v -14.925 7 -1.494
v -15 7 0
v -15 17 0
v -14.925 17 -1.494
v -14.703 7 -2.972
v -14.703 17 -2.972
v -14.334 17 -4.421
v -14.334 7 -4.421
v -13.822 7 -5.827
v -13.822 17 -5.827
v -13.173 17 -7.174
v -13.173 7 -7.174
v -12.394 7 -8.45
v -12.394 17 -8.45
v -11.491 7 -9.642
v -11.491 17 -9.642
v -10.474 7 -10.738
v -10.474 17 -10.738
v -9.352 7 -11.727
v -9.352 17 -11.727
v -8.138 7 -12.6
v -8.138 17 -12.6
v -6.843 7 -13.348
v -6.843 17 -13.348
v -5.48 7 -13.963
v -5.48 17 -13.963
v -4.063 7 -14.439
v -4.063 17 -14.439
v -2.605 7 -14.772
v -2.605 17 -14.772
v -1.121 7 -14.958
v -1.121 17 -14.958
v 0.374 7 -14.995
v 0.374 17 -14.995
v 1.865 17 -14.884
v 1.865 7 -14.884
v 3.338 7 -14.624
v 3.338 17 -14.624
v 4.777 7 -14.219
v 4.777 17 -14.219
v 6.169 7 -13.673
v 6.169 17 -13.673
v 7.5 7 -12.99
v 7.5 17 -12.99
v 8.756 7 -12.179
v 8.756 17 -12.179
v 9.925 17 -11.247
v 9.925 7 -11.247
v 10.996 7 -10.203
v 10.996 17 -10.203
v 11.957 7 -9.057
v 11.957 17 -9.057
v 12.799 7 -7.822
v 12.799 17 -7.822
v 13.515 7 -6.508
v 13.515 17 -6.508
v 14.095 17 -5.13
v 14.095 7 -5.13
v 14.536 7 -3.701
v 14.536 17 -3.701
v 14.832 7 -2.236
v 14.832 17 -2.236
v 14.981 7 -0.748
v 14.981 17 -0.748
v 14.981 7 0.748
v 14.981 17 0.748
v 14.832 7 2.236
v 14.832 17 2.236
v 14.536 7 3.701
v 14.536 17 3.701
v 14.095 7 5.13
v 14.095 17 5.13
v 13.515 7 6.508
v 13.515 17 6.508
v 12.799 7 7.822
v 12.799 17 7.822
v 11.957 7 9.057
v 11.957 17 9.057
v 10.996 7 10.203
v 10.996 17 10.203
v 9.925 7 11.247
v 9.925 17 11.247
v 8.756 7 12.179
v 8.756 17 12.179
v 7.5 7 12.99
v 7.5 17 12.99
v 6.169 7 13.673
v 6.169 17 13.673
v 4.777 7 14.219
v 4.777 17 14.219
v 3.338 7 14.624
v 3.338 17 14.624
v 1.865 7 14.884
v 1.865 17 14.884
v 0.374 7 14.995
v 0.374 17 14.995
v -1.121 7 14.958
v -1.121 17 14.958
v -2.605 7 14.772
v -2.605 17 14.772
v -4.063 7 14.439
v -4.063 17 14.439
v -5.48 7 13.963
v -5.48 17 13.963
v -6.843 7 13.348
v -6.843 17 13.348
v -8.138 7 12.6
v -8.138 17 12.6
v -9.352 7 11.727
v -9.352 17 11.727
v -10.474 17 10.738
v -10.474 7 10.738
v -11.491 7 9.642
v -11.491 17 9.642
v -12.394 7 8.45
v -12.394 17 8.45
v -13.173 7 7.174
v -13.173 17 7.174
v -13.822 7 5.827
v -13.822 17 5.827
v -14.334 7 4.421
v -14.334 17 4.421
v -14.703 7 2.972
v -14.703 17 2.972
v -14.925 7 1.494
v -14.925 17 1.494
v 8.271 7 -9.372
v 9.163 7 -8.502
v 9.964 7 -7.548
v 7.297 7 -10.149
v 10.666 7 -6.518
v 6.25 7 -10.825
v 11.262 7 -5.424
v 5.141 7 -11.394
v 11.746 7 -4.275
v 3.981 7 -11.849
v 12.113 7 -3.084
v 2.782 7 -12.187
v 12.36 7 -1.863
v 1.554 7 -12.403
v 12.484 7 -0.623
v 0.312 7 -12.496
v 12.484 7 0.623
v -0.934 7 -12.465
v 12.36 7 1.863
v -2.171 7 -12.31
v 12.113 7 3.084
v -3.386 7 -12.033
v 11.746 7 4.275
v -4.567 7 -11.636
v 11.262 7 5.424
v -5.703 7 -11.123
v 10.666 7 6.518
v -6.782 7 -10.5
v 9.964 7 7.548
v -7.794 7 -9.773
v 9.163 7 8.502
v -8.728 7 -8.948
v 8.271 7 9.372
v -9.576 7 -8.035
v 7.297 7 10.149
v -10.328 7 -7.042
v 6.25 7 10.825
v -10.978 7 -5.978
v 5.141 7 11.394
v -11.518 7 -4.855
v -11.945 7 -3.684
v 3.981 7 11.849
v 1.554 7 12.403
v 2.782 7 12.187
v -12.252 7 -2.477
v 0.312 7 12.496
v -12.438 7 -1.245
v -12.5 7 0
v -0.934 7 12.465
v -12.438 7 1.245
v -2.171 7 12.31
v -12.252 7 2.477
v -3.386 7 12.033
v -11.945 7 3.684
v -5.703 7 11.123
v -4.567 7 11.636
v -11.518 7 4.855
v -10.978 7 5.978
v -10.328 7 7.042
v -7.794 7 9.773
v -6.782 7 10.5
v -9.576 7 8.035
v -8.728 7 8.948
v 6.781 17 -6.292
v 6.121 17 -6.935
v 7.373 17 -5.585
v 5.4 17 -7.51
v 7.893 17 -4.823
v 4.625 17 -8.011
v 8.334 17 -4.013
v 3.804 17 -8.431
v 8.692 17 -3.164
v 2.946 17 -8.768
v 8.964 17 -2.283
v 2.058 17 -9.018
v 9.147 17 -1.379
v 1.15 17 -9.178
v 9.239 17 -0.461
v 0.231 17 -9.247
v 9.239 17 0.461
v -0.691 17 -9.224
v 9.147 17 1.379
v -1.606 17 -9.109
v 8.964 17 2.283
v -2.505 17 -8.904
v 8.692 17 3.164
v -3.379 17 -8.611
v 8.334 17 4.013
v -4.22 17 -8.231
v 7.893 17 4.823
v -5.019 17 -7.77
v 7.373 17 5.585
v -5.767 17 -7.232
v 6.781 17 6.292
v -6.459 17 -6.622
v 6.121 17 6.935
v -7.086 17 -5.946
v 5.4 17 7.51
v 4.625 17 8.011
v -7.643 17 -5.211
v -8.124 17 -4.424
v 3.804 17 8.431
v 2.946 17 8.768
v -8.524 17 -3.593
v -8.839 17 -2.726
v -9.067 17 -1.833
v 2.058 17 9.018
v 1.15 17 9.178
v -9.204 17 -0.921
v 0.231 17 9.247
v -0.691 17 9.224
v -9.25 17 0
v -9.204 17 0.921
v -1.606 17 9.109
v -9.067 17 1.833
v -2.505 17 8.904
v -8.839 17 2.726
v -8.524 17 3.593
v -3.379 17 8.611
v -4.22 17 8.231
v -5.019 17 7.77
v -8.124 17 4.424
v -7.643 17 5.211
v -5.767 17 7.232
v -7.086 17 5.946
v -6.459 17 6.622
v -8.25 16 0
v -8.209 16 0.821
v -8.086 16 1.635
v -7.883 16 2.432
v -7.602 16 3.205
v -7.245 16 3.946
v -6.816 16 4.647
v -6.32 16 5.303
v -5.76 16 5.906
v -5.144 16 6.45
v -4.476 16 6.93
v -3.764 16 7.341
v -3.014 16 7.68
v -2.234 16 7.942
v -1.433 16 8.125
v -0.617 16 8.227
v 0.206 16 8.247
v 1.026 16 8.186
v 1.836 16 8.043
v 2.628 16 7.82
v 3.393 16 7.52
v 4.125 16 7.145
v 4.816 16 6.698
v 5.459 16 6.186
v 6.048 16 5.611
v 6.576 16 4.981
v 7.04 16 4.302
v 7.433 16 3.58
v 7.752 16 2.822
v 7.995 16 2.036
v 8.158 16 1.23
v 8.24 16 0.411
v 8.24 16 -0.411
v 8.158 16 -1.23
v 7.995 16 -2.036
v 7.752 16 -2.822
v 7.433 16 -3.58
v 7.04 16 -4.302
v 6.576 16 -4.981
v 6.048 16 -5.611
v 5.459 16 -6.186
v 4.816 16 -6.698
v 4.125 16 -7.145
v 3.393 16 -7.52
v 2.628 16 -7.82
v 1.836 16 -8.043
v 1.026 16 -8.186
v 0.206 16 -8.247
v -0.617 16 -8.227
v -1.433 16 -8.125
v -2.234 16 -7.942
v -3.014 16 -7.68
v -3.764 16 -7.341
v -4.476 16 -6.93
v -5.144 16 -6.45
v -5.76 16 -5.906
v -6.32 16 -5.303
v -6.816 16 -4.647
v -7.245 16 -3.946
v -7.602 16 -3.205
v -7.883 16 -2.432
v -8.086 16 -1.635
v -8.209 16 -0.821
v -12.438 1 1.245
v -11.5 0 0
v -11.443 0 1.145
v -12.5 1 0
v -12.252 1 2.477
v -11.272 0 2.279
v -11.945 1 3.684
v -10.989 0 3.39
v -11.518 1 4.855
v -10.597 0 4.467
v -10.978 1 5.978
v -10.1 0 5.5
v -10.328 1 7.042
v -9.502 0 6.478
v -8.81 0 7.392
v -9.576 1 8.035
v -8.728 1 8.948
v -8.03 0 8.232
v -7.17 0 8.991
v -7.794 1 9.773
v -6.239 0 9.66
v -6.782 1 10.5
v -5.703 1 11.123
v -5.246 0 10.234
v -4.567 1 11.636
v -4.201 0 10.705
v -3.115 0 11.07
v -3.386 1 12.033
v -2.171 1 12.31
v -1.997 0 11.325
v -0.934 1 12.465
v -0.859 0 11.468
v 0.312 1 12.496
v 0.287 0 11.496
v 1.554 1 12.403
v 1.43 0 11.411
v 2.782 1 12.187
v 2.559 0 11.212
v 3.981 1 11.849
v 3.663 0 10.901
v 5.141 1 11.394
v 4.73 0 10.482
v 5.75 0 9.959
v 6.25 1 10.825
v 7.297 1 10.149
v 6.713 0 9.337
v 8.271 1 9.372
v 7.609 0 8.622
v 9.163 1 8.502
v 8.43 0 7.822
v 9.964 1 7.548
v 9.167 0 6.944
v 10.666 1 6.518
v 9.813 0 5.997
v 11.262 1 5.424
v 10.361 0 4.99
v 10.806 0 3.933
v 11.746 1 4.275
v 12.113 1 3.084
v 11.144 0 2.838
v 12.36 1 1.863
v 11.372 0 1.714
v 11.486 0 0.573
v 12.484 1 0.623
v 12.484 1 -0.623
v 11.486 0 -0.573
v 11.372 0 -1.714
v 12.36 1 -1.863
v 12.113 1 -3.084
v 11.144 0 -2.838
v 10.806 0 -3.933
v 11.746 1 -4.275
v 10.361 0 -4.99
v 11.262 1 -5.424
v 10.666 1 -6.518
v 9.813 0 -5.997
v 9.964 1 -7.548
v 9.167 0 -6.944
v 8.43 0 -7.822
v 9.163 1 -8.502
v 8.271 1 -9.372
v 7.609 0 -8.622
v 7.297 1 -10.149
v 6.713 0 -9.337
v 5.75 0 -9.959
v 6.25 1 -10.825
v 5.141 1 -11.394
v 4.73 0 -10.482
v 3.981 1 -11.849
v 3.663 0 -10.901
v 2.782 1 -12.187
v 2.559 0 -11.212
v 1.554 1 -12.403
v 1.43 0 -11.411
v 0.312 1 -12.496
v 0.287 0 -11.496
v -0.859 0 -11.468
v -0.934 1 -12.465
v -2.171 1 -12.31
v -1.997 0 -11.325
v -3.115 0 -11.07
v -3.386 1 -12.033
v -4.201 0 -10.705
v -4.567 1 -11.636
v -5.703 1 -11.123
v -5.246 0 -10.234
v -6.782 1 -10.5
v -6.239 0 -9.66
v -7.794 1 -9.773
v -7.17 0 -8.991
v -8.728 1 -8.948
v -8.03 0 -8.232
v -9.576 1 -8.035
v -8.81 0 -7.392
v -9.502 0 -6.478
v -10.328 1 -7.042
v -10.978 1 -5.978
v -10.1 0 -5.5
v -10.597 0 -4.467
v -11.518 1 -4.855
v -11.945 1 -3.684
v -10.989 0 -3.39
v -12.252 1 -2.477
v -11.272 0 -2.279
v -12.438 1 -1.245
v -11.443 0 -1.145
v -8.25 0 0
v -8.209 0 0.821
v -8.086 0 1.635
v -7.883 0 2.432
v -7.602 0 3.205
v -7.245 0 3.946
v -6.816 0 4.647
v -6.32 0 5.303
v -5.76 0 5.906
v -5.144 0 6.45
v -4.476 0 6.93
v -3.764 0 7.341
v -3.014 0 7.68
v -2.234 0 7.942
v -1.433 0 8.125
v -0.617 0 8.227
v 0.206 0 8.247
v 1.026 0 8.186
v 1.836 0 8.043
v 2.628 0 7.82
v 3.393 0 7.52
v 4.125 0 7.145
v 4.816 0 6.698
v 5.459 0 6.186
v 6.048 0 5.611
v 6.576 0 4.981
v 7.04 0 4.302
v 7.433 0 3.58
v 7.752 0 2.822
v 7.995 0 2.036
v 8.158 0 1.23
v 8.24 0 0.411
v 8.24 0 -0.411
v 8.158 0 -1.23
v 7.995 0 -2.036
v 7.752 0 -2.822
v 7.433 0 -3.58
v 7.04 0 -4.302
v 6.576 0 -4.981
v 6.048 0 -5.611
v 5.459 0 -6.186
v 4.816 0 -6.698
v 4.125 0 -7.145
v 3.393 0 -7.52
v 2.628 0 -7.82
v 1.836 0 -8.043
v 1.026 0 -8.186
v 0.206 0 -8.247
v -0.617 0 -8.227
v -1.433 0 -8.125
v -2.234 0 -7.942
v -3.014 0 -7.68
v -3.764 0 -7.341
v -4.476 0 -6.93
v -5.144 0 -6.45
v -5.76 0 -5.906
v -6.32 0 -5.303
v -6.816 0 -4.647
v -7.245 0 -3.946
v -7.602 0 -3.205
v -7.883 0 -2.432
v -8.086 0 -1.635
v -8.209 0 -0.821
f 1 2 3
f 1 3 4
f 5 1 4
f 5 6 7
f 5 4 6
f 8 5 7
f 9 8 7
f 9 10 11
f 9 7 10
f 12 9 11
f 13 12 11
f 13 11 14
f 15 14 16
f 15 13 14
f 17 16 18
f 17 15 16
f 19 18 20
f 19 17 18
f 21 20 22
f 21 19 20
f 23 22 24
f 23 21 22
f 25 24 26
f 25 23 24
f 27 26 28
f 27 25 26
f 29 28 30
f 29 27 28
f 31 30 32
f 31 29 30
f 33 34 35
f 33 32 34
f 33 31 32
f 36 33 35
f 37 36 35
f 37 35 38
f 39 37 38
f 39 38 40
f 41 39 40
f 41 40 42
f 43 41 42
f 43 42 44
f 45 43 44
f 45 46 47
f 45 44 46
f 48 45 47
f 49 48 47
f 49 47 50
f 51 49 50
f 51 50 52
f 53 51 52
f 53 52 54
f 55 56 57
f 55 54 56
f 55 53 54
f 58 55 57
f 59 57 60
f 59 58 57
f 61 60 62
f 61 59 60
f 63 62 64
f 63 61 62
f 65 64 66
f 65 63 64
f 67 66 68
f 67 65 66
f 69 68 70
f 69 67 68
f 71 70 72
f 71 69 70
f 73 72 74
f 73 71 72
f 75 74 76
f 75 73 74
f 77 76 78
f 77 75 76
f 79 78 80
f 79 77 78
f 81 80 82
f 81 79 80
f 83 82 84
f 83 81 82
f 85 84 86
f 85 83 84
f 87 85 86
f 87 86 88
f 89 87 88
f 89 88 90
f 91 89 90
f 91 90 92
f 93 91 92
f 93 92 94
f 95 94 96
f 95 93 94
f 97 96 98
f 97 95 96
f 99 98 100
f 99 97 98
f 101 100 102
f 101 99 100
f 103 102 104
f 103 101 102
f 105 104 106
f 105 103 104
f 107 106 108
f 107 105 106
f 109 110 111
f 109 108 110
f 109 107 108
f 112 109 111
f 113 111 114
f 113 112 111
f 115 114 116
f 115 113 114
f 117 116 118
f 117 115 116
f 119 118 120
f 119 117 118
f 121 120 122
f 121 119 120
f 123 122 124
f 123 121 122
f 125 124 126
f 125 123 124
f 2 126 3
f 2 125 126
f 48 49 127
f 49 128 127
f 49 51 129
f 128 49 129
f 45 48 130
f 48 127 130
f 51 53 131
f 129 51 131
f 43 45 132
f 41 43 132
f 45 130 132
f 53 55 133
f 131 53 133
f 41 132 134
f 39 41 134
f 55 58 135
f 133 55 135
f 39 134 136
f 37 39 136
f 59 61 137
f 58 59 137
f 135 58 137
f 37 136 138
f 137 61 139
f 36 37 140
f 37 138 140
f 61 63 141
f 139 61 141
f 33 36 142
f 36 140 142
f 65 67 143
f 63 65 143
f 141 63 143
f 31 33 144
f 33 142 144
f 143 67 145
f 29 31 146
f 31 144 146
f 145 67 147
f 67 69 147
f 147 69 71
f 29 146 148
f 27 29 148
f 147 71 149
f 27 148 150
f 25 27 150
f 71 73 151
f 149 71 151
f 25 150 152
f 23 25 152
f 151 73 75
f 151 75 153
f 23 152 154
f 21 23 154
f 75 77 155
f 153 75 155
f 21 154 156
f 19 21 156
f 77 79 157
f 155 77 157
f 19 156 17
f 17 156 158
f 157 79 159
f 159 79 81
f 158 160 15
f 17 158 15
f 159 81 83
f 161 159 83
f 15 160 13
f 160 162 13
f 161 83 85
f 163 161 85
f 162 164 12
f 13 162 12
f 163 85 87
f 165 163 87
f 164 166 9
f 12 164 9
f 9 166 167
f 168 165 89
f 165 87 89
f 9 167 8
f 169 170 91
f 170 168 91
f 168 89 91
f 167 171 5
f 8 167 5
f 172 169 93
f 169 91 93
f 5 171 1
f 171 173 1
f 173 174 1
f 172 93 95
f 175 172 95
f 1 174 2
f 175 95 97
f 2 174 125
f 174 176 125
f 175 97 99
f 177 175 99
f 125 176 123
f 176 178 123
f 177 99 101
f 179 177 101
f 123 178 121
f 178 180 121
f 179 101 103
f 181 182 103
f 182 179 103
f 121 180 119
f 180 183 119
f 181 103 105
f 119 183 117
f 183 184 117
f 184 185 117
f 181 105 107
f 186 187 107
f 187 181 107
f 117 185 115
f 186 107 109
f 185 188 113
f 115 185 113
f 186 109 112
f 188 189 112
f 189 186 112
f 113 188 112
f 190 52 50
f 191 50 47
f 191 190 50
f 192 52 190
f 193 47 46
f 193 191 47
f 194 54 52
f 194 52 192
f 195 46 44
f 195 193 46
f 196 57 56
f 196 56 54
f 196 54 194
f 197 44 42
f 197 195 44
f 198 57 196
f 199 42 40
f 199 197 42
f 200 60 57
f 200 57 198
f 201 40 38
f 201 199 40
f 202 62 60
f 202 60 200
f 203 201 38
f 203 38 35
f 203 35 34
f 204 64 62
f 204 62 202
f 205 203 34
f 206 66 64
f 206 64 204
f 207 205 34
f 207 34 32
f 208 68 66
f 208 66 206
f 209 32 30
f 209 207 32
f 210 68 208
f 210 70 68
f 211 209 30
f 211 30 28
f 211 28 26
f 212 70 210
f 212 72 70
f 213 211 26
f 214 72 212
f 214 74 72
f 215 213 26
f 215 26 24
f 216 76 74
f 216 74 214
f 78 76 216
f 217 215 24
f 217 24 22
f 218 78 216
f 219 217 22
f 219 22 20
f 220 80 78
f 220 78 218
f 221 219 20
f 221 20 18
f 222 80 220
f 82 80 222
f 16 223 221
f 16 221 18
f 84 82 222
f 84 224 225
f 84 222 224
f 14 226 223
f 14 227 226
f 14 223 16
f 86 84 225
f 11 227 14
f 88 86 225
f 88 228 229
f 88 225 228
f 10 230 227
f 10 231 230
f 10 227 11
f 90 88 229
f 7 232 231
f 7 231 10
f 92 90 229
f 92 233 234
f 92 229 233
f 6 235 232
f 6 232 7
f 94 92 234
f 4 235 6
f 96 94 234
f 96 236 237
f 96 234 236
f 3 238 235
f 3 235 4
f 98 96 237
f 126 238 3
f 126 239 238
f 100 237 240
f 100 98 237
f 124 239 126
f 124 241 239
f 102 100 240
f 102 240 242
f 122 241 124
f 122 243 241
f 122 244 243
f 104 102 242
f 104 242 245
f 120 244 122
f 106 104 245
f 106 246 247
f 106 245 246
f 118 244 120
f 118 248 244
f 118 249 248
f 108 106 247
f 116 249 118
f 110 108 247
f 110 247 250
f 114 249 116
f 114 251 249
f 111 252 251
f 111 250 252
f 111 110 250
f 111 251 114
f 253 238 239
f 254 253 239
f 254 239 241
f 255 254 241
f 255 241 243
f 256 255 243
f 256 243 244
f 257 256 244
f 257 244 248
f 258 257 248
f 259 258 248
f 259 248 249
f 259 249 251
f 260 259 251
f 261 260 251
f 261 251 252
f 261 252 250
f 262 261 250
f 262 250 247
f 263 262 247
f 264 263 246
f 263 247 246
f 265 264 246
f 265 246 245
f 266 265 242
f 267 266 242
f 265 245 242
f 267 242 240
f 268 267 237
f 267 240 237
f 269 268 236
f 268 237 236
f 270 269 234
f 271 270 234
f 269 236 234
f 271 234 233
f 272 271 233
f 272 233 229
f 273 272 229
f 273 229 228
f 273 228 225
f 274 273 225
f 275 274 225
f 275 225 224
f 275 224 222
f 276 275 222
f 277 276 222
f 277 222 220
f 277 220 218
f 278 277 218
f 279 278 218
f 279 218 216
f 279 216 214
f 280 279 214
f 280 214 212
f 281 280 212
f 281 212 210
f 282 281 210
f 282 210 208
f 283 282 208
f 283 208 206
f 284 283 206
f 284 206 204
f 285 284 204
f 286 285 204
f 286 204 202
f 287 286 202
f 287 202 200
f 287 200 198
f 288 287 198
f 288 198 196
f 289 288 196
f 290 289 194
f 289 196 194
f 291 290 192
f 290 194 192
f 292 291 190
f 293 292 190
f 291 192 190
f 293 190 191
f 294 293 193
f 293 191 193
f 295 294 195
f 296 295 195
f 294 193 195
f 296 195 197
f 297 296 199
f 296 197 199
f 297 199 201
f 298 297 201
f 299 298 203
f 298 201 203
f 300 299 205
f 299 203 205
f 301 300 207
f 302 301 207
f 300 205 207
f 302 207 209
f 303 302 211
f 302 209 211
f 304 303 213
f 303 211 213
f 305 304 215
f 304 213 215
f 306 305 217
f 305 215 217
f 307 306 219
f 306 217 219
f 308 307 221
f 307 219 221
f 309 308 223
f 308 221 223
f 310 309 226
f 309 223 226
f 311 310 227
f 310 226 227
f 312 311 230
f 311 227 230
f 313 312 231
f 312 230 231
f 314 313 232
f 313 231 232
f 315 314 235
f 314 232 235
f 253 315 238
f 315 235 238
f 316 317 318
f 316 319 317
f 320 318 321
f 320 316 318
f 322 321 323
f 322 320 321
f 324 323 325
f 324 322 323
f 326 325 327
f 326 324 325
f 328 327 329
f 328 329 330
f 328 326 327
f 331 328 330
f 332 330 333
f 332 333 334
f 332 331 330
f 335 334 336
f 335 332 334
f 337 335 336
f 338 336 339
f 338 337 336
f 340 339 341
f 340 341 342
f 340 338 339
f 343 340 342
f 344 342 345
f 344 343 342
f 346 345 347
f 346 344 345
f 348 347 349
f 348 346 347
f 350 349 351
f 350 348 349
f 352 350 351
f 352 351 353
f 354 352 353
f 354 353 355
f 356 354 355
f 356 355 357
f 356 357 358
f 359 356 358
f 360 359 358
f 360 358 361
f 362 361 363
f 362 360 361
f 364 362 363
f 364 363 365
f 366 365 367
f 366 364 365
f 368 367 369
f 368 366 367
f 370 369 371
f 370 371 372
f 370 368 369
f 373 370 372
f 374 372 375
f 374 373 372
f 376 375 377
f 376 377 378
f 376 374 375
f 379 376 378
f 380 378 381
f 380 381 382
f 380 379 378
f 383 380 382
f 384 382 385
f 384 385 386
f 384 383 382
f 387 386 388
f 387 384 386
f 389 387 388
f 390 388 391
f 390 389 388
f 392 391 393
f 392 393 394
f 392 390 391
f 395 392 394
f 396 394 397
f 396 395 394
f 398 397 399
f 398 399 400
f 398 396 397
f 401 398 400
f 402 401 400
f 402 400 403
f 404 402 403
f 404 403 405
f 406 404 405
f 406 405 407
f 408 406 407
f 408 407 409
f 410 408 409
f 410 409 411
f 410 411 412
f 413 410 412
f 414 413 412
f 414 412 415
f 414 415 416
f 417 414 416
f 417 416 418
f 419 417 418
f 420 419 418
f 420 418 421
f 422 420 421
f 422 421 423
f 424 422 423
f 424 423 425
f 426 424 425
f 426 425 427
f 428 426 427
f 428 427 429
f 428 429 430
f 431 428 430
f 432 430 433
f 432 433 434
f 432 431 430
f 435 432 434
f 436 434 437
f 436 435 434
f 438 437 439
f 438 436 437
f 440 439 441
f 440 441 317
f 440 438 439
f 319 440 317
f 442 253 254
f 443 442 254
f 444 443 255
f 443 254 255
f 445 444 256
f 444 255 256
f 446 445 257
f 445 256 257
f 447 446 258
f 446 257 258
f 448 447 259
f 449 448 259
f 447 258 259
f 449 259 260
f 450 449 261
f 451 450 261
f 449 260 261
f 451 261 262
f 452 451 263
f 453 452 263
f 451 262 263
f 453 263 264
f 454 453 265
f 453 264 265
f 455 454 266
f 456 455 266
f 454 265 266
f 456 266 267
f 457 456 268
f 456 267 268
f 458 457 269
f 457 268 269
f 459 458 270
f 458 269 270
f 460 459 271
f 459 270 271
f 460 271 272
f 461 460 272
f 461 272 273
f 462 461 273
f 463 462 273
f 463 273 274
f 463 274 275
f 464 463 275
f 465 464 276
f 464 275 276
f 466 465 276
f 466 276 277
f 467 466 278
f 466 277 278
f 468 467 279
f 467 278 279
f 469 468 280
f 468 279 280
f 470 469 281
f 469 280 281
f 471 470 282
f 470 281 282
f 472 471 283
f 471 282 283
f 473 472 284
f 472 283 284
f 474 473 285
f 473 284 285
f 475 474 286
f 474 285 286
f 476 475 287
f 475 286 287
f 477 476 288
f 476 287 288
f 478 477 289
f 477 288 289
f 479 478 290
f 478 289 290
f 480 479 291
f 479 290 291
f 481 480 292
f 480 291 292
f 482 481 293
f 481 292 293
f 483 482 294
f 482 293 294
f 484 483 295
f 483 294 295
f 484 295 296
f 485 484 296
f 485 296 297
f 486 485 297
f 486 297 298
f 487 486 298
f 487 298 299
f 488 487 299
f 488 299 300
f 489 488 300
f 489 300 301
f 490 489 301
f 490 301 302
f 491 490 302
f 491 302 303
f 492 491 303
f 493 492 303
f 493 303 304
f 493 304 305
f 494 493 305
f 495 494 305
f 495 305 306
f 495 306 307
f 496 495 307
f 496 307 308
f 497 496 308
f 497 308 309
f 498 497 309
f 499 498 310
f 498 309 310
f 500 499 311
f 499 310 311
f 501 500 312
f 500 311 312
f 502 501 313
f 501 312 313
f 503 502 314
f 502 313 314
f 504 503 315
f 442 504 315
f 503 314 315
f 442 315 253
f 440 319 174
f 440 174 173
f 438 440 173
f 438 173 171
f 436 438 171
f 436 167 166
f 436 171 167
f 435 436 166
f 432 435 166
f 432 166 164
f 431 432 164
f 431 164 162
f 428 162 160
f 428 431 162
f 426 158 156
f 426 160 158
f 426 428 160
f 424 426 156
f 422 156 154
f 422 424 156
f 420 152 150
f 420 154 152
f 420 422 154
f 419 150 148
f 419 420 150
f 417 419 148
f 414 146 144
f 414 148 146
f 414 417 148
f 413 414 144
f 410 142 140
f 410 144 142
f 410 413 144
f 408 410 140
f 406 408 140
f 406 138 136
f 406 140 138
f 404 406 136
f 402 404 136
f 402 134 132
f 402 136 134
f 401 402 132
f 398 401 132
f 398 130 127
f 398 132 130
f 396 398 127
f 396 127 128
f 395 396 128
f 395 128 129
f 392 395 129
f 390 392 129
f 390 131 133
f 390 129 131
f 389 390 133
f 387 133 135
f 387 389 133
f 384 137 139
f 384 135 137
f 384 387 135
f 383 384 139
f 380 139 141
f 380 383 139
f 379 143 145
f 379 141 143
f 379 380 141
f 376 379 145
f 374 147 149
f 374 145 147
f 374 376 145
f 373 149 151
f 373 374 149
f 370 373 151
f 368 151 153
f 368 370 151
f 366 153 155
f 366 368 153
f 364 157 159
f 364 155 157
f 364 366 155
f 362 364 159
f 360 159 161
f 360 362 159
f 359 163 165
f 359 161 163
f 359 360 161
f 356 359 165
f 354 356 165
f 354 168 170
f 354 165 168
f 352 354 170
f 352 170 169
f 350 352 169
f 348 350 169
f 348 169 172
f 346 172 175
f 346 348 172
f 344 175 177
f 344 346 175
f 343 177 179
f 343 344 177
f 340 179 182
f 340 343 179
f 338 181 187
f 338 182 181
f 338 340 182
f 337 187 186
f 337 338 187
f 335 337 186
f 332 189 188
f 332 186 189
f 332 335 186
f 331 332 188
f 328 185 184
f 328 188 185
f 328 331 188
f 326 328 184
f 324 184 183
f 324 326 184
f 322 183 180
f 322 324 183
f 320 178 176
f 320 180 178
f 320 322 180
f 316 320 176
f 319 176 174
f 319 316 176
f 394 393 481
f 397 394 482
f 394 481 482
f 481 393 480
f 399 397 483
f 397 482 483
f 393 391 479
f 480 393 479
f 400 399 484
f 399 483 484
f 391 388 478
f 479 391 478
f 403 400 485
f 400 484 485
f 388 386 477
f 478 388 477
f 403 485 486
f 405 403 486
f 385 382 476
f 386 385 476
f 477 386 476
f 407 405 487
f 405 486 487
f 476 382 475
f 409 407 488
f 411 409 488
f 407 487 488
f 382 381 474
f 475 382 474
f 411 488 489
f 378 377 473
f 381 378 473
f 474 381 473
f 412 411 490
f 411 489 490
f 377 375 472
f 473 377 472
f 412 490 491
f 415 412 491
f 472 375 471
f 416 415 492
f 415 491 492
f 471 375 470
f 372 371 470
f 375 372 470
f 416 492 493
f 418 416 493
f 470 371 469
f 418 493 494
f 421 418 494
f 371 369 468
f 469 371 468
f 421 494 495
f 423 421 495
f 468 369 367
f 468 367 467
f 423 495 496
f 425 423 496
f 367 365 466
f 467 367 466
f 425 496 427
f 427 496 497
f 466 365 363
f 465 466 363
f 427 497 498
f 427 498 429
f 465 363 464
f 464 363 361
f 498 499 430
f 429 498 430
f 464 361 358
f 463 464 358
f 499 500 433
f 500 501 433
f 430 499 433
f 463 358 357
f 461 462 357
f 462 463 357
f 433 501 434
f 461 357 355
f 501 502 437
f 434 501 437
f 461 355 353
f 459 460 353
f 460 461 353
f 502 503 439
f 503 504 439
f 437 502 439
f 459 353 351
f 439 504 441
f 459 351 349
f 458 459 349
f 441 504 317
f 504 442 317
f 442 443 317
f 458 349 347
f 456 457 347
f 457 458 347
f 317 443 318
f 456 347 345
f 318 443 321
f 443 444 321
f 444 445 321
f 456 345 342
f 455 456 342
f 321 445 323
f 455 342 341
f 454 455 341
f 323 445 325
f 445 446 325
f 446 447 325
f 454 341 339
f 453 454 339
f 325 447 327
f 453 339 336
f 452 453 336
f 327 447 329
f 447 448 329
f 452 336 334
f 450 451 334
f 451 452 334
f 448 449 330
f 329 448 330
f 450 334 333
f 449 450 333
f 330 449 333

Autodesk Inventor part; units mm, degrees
ref_plane "YZ Plane" through (0, 0, 0) normal (1, 0, 0) x (0, 1, 0)
ref_plane "XZ Plane" through (0, 0, 0) normal (0, 1, 0) x (-1, 0, 0)
ref_plane "XY Plane" through (0, 0, 0) normal (0, 0, 1) x (1, 0, 0)
sketch "Szkic1" plane through (0, 0, 0) normal (0, 1, 0) x (-1, 0, 0)
  circle A0 centre (0, 0) radius 15
  circle A1 centre (0, 0) radius 8.25
  circle A2 centre (0, 0) radius 12.5
  dimension "d0" = 30
  dimension "d1" = 16.5
  dimension "d2" = 25
extrude "Wyciągnięcie proste1" add sketch "Szkic1" along normal blind 17 contours A0 | A1 | A2
extrude "Wyciągnięcie proste2" cut sketch "Szkic1" against normal blind 35 from surface at 17 contours A1
extrude "Wyciągnięcie proste3" cut sketch "Szkic1" along normal blind 7 contours A0
chamfer "Faza1" distance 1 angle 45 2 edges at (12.5, 0, 0) (8.25, 17, 0)
properties part number "X_end_floating_cup" material "Tworzywo sztuczne ABS"
